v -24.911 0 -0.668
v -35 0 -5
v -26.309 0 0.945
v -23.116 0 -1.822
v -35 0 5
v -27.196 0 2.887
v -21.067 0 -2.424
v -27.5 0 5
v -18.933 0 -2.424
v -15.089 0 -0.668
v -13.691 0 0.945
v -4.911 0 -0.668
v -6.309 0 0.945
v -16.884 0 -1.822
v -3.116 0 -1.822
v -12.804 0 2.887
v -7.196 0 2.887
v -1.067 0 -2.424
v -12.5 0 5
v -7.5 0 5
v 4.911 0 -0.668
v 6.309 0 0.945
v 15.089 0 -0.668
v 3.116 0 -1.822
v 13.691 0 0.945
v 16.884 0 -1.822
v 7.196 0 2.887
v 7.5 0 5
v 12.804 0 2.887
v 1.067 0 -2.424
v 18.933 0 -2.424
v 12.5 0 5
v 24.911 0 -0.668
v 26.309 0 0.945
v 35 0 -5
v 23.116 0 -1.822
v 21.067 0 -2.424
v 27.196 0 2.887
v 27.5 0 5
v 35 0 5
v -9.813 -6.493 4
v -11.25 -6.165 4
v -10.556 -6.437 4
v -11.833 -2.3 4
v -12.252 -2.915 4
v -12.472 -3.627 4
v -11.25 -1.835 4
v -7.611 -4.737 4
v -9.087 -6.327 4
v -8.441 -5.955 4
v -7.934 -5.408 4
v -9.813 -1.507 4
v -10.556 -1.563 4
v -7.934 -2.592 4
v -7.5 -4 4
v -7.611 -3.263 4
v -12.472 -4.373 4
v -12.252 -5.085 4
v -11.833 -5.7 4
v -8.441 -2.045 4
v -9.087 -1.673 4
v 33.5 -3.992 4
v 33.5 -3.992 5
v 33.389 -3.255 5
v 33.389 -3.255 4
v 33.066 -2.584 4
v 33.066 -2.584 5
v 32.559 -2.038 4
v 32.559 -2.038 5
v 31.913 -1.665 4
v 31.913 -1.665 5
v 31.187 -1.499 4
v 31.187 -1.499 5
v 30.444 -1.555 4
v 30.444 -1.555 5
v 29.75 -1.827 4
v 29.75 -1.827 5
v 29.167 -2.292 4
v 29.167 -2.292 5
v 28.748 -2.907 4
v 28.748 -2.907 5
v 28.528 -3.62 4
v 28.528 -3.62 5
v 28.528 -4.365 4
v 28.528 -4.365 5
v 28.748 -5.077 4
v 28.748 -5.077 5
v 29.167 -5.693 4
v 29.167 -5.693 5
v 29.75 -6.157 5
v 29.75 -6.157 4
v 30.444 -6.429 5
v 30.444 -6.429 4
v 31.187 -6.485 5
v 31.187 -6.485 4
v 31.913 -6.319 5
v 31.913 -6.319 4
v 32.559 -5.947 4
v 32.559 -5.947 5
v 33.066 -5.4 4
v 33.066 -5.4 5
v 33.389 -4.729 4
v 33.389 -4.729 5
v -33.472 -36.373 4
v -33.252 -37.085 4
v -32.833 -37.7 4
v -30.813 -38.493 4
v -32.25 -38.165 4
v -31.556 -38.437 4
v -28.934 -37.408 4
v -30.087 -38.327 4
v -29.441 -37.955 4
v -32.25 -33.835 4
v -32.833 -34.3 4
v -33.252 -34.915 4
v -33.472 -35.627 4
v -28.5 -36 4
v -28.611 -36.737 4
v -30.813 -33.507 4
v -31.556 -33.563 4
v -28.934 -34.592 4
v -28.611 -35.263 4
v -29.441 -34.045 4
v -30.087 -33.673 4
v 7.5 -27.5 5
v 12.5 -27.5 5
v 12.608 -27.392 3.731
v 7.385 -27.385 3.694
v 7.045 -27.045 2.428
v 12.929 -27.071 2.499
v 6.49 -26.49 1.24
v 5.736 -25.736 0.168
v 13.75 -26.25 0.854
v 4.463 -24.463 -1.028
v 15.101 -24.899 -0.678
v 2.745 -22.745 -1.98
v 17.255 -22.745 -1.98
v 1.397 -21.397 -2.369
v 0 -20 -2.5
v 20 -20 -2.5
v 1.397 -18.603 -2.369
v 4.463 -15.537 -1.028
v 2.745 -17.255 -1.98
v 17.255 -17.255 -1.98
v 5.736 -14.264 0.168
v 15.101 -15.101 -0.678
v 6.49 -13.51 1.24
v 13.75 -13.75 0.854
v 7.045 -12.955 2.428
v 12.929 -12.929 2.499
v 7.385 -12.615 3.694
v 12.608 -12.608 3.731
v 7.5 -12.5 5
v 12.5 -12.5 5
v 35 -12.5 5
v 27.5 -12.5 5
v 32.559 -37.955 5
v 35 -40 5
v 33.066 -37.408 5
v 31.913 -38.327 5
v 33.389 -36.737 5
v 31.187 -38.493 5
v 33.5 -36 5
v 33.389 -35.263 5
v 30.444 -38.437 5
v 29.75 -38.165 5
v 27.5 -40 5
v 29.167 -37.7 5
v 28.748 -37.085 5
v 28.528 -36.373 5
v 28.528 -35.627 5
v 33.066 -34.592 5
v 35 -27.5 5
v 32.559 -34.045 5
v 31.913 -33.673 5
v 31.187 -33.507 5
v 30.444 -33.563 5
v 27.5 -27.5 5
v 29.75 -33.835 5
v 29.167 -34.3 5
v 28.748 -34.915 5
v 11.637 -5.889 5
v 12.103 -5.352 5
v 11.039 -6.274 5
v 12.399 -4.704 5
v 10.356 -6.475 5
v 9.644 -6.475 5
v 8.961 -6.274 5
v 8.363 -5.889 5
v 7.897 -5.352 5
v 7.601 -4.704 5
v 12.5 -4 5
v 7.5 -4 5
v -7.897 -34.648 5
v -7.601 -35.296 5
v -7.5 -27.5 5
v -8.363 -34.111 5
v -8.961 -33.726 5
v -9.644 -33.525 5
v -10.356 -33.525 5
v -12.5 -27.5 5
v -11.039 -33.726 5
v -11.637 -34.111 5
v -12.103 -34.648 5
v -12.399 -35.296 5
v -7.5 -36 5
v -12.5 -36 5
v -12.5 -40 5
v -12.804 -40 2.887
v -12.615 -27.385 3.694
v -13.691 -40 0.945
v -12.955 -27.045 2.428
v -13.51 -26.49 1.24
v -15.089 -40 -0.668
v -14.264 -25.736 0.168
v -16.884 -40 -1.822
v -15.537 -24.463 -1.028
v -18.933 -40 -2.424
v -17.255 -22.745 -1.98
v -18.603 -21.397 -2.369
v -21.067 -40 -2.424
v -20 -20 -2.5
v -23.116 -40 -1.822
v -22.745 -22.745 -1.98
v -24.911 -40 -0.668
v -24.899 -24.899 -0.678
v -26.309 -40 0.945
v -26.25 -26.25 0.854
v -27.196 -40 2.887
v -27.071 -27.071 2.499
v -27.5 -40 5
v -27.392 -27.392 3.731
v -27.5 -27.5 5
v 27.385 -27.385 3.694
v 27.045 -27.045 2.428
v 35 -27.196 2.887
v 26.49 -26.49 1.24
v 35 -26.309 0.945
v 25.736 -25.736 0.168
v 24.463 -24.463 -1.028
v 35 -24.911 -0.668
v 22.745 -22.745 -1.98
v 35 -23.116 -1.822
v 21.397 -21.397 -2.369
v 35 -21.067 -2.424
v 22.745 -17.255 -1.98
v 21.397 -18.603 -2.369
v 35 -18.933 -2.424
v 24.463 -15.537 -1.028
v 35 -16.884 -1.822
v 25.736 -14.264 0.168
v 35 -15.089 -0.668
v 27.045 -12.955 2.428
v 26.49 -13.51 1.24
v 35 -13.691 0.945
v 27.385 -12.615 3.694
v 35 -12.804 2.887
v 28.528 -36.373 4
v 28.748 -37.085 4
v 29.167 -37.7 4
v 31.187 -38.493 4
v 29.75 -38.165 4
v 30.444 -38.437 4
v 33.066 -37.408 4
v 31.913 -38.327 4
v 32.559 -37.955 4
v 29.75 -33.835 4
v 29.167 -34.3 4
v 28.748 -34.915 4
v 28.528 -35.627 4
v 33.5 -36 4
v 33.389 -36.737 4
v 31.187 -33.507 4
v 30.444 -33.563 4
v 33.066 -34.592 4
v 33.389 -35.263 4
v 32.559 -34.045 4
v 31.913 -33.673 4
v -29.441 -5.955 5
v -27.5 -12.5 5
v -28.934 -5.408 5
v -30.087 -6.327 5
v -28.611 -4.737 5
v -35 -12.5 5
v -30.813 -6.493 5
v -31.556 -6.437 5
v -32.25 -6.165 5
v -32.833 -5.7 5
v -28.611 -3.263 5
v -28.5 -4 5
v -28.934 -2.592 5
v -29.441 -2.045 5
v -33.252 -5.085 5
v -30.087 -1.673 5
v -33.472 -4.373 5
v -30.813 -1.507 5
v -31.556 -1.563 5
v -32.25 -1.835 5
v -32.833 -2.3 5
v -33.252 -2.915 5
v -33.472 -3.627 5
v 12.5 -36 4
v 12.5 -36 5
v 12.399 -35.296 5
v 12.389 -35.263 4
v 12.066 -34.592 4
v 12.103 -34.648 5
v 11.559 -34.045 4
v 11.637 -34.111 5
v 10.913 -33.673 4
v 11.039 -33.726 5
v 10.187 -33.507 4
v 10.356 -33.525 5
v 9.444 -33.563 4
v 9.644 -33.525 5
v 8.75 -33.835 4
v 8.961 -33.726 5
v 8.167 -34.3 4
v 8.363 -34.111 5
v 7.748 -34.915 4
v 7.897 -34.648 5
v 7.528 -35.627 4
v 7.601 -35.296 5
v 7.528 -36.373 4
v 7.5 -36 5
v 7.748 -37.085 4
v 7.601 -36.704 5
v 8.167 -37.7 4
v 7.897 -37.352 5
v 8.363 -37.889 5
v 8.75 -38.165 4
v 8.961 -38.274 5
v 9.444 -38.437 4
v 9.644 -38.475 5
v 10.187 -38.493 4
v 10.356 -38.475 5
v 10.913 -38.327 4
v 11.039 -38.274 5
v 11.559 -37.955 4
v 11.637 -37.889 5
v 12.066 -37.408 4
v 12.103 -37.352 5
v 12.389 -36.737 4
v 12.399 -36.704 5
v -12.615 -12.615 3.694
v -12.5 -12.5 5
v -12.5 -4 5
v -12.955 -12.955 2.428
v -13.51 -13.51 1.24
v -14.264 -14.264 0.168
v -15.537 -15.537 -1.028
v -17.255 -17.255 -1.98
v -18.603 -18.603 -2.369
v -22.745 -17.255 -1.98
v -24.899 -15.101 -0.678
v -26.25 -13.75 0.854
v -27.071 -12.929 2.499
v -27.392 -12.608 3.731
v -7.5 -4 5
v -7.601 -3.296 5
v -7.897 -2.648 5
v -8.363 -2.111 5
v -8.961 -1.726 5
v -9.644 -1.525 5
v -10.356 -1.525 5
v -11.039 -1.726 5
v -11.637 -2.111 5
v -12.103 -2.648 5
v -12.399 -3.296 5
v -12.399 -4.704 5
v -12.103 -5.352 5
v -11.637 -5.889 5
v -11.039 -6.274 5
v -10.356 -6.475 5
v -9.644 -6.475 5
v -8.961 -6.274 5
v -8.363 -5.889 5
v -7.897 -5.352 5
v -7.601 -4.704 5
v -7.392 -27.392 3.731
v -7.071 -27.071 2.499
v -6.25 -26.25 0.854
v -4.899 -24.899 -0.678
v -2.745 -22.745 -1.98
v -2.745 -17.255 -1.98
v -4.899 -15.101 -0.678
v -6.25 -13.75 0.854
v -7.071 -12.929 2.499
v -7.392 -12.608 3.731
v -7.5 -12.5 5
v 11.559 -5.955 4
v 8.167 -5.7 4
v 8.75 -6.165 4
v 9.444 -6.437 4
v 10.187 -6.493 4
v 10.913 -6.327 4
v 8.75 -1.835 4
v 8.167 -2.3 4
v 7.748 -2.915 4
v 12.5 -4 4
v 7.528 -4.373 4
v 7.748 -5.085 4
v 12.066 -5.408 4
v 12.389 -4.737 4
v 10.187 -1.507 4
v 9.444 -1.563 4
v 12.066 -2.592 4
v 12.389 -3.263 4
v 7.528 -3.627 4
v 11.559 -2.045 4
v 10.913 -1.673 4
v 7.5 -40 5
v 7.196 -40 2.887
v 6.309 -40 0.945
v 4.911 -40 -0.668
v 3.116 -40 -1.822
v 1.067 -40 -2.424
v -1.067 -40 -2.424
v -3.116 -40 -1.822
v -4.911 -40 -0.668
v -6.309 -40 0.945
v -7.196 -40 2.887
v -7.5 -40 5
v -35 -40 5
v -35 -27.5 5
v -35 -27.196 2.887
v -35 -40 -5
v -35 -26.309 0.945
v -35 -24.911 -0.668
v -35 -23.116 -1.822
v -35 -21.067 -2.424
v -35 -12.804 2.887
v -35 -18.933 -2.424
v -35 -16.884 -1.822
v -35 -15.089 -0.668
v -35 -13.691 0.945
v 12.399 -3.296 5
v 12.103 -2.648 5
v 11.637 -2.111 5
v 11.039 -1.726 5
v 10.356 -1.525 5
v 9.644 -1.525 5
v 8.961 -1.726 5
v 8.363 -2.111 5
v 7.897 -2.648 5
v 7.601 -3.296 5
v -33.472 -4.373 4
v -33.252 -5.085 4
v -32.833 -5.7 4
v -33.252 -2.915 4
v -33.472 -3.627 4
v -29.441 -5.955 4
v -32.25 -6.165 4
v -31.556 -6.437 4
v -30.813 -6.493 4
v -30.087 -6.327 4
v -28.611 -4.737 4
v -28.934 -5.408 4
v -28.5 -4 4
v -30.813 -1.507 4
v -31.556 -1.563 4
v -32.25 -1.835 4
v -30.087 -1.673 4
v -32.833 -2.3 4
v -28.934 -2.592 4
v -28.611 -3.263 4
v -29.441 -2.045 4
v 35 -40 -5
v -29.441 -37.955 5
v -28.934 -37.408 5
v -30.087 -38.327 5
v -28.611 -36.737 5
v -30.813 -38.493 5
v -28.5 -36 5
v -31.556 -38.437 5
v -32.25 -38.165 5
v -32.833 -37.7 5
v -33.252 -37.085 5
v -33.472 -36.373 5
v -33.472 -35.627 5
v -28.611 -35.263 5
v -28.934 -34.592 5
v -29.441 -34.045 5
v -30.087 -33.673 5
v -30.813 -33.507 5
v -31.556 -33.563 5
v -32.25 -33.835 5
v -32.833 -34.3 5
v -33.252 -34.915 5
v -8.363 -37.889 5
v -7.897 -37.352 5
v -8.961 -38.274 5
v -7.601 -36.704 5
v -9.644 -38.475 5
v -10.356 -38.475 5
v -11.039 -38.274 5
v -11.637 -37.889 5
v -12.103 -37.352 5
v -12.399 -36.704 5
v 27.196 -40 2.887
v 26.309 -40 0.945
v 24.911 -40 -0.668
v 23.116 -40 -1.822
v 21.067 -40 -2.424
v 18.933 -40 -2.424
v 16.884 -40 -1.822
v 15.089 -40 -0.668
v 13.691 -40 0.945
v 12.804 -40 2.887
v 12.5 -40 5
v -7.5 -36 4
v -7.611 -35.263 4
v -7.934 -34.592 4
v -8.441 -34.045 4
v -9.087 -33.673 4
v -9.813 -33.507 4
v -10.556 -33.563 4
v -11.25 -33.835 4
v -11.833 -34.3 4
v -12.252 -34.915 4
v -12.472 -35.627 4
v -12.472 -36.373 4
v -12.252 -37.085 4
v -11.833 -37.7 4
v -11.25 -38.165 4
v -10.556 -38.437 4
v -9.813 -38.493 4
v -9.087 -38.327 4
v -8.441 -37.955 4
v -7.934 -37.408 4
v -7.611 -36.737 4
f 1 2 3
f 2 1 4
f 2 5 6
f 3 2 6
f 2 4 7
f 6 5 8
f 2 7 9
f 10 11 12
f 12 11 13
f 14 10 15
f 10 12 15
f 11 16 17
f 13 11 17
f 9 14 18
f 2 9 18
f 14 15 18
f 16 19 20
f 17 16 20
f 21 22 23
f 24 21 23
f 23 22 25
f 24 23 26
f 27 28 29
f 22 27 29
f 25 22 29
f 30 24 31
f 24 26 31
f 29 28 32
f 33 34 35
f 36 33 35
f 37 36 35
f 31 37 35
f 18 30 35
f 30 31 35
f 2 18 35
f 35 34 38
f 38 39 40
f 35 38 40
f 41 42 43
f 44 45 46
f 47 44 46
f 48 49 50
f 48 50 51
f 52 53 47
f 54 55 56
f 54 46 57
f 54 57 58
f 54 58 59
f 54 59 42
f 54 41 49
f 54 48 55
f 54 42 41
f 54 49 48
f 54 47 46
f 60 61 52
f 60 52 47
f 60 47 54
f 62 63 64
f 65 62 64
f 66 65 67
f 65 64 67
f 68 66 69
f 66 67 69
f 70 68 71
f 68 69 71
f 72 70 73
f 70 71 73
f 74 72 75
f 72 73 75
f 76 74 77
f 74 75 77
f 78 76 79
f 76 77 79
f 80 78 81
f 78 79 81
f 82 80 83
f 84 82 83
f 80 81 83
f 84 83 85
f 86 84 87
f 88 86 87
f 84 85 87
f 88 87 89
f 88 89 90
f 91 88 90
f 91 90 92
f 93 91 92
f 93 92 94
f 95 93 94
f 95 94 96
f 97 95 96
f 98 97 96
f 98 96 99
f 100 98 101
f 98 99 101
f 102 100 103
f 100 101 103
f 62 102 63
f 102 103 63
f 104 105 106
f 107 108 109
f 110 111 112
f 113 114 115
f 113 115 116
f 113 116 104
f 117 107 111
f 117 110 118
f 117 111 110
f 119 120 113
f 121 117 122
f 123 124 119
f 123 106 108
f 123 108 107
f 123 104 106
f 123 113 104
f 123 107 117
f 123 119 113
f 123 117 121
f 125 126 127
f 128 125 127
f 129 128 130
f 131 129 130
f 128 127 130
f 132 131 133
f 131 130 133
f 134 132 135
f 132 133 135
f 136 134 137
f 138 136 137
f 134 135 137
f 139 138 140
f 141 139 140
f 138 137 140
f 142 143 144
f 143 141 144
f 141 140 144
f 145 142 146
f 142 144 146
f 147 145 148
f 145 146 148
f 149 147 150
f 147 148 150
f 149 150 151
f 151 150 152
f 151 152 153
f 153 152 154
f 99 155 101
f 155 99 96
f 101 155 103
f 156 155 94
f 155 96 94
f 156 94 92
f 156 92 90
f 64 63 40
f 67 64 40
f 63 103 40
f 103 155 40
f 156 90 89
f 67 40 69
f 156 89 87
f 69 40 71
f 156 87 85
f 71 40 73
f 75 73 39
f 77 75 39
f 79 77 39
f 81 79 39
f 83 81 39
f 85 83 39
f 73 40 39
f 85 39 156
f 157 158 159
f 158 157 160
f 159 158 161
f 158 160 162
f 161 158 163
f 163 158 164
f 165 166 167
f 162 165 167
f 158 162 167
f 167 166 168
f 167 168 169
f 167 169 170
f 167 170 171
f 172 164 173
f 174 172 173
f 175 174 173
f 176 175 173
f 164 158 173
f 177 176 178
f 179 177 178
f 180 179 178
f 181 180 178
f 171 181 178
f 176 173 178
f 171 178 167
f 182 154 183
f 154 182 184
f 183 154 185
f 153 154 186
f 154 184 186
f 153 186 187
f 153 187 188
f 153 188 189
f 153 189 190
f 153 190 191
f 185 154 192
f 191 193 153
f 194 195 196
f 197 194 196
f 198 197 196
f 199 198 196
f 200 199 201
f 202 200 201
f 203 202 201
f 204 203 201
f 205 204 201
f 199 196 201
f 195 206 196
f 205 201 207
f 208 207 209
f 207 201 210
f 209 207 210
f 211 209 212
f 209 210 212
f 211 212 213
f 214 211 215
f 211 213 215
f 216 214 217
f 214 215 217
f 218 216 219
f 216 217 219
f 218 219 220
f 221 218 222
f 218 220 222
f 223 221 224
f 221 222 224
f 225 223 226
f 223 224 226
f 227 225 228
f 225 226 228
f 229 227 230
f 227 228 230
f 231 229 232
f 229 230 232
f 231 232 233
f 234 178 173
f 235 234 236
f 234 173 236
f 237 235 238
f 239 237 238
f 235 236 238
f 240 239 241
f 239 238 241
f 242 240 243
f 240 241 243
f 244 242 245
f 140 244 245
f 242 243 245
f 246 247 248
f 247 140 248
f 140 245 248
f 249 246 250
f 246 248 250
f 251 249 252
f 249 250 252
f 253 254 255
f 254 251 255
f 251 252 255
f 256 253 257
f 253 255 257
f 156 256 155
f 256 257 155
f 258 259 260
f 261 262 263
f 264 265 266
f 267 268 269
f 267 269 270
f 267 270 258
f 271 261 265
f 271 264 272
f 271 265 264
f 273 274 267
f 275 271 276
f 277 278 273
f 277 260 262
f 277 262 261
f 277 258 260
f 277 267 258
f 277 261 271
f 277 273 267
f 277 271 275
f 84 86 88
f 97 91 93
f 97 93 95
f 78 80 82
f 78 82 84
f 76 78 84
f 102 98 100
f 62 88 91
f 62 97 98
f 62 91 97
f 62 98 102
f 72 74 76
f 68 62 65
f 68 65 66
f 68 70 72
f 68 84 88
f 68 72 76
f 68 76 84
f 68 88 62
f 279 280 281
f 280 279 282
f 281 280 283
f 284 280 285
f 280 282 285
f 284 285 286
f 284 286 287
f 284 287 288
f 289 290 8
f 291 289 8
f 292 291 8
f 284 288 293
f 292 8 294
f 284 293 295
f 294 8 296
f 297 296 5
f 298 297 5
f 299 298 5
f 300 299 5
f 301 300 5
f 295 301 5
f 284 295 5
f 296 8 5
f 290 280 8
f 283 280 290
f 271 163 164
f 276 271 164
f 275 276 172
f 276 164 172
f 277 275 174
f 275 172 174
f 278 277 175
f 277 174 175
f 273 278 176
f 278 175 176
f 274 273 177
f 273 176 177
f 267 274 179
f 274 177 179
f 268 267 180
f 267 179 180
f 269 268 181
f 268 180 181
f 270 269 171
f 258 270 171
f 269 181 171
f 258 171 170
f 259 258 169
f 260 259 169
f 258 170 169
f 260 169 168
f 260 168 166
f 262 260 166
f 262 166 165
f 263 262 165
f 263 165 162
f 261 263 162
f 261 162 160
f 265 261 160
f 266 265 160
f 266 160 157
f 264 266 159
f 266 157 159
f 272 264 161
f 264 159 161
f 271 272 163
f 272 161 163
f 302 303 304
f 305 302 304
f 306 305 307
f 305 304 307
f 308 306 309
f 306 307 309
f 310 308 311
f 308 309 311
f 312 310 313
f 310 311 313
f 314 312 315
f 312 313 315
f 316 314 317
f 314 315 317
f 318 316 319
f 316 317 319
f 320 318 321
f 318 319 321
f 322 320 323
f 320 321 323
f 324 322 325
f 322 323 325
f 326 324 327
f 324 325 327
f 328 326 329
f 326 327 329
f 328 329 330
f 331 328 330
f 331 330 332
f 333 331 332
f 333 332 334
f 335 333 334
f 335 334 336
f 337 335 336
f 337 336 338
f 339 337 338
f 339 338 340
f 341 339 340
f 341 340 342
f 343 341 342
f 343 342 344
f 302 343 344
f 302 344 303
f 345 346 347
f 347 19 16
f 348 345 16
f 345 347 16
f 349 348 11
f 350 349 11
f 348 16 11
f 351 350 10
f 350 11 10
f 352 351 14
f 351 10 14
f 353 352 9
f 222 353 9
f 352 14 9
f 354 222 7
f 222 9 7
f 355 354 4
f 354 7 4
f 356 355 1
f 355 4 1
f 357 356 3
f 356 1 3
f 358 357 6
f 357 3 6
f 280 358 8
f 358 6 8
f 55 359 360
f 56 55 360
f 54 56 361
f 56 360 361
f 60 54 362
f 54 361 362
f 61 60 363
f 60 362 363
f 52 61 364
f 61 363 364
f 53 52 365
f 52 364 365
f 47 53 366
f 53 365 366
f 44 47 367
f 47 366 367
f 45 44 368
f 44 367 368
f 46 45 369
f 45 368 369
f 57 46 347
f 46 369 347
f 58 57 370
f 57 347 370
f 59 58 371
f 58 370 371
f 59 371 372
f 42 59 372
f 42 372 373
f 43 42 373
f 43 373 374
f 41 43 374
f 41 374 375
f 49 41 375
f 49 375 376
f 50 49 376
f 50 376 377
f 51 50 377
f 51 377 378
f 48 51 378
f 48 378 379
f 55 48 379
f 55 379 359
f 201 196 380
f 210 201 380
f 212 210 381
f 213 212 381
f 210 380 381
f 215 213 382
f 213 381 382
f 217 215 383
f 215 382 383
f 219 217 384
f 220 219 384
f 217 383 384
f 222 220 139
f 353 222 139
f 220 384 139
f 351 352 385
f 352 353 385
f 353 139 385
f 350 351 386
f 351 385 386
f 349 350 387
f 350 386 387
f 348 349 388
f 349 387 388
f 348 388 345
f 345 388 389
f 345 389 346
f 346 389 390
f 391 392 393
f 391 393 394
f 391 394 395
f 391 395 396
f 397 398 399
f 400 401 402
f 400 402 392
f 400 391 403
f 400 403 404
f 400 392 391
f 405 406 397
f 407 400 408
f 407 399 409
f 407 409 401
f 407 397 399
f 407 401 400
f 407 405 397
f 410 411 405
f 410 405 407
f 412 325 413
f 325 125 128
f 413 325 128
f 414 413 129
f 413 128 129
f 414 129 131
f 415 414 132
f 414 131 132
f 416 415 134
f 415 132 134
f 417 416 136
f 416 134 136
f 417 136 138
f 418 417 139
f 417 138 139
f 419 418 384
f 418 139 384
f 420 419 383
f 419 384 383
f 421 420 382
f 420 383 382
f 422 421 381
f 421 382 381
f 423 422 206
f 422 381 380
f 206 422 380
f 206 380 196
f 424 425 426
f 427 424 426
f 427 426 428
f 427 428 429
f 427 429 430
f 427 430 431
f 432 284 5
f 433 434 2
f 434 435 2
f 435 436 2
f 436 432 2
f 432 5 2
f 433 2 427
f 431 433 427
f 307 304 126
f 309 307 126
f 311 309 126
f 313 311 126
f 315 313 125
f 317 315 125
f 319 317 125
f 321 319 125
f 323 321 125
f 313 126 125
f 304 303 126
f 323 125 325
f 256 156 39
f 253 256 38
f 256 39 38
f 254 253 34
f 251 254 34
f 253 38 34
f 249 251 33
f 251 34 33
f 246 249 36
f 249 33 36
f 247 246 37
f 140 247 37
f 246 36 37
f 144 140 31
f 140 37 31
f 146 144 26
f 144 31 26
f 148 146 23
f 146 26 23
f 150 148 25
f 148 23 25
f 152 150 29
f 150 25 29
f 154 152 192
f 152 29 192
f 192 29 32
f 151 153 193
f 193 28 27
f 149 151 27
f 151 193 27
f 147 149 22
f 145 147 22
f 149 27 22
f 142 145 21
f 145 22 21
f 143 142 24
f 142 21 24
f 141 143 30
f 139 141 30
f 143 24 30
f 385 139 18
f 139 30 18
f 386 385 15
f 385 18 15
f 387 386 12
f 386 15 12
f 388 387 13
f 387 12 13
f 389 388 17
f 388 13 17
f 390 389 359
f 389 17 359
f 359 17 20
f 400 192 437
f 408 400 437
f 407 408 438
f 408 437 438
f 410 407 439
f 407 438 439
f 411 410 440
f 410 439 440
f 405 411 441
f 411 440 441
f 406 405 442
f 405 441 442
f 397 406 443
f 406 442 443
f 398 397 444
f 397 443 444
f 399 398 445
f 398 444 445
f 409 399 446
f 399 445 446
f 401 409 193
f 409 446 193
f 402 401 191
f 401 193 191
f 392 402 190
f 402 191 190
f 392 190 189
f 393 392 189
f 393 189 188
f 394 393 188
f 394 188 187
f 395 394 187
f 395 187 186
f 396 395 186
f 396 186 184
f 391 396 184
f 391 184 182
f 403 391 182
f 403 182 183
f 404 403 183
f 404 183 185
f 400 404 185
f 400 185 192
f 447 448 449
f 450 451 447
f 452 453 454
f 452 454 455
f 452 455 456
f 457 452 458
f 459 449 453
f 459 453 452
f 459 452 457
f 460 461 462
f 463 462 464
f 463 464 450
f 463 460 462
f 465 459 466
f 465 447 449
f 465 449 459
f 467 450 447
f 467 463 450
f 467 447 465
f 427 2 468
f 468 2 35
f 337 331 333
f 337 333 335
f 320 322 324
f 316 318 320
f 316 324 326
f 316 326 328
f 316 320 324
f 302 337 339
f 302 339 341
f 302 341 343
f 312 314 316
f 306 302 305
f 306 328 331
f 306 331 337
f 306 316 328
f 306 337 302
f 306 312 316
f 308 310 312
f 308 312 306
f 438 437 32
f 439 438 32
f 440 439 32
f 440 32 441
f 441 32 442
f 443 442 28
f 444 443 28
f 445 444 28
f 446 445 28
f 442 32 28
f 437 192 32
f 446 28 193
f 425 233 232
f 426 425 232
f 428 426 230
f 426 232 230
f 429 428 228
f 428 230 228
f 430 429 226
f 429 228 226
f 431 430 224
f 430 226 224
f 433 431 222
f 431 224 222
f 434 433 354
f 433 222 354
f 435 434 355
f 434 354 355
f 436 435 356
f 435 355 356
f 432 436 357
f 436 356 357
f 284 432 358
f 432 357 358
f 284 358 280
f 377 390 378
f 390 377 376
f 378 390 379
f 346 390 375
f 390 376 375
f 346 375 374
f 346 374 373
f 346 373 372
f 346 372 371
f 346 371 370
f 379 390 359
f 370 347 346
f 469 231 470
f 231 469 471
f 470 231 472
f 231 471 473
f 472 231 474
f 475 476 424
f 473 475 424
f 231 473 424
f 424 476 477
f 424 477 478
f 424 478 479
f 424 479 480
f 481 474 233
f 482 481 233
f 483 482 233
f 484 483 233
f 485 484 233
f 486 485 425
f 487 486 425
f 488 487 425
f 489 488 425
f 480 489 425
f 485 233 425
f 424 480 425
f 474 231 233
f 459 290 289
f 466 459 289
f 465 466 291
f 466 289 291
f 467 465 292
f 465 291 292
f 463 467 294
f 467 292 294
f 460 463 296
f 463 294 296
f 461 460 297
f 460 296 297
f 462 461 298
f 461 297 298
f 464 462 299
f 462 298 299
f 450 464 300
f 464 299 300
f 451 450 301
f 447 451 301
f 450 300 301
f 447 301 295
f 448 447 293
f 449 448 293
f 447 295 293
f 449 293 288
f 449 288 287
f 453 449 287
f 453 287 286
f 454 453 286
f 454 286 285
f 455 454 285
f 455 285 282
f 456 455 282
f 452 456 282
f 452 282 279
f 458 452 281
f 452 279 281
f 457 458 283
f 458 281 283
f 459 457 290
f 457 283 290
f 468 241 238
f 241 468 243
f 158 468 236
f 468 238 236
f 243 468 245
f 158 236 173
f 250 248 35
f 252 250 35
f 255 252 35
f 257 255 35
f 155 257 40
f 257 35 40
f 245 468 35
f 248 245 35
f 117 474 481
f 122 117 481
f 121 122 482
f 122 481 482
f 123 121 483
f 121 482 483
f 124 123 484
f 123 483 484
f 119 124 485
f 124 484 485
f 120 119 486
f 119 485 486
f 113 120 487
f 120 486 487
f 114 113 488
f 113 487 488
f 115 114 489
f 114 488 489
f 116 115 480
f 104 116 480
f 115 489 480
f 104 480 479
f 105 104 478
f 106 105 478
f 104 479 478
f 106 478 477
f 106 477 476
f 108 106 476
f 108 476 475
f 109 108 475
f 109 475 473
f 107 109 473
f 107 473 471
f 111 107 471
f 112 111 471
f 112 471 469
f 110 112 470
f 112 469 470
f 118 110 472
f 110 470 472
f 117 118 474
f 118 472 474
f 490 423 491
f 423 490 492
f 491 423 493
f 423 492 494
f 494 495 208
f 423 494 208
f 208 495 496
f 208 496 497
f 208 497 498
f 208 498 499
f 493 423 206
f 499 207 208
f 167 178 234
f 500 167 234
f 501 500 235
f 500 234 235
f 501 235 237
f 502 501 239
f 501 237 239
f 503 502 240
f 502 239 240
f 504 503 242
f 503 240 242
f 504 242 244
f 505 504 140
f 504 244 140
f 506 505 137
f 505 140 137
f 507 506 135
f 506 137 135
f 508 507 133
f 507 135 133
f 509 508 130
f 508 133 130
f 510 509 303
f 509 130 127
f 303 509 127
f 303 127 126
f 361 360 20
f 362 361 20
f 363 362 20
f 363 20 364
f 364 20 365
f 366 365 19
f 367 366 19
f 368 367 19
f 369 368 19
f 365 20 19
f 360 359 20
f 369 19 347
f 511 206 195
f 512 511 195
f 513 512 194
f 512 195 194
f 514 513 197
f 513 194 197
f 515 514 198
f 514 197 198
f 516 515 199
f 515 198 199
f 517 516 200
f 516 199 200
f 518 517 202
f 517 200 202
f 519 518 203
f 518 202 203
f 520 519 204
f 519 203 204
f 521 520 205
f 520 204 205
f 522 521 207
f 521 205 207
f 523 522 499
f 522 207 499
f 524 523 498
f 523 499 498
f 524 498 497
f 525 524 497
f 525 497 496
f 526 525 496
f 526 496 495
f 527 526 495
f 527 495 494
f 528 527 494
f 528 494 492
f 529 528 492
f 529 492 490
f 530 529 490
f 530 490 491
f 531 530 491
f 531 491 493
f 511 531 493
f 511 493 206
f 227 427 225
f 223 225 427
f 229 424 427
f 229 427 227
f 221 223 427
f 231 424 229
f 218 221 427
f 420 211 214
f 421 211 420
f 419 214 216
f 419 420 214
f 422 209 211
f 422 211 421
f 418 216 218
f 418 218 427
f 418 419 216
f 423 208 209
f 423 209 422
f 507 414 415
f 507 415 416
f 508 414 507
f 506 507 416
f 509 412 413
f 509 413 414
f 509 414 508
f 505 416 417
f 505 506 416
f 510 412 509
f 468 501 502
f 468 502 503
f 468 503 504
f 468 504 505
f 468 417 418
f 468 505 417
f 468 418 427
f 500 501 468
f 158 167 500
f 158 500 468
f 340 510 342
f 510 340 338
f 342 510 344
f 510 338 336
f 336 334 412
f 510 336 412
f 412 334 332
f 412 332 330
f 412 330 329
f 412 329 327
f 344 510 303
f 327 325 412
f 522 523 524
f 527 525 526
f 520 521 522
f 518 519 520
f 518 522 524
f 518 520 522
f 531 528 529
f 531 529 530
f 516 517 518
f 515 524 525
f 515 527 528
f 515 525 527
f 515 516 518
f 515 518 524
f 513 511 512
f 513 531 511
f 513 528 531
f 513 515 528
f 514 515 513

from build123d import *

# Parameters (mm, degrees)
F1_DEPTH  = 40
F3_DEPTH  = 70.001
F4_R      = 2.5
F5_DEPTH  = 1
F6_R      = 2.5
F7_DEPTH  = 1
F8_R      = 2.5
F9_DEPTH  = 1
F10_R     = 2.5
F11_DEPTH = 1
F13_DEPTH = 1
F15_DEPTH = 1
F17_DEPTH = 1
F19_DEPTH = 1


with BuildPart() as f1:
    # F0 (on Front) → F1 (new body)
    with BuildSketch(Plane.XZ):
        with BuildLine():
            Line((-35, -5), (35, -5))
            Line((35, -5), (35, 5))
            Line((35, 5), (27.5, 5))
            ThreePointArc((27.5, 5), (20, -2.5), (12.5, 5))
            Line((12.5, 5), (7.5, 5))
            ThreePointArc((7.5, 5), (0, -2.5), (-7.5, 5))
            Line((-7.5, 5), (-12.5, 5))
            ThreePointArc((-12.5, 5), (-20, -2.5), (-27.5, 5))
            Line((-27.5, 5), (-35, 5))
            Line((-35, 5), (-35, -5))
        make_face()
    extrude(amount=F1_DEPTH)

    # F2 (on face) → F3 (cut, through all)
    with BuildSketch(Plane.YZ.offset(35)):
        with BuildLine():
            ThreePointArc((-27.5, 5), (-20, -2.5), (-12.5, 5))
            Line((-12.5, 5), (-27.5, 5))
        make_face()
    extrude(amount=-F3_DEPTH, mode=Mode.SUBTRACT)

    # F4 (on face) → F5 (cut)
    with BuildSketch(Plane.XY.offset(5)):
        with Locations((31, -36)):
            Circle(F4_R)
    extrude(amount=-F5_DEPTH, mode=Mode.SUBTRACT)

    # F6 (on face) → F7 (cut)
    with BuildSketch(Plane.XY.offset(5)):
        with Locations((31, -3.9921798557)):
            Circle(F6_R)
    extrude(amount=-F7_DEPTH, mode=Mode.SUBTRACT)

    # F8 (on face) → F9 (cut)
    with BuildSketch(Plane.XY.offset(5)):
        with Locations((-31, -36)):
            Circle(F8_R)
    extrude(amount=-F9_DEPTH, mode=Mode.SUBTRACT)

    # F10 (on face) → F11 (cut)
    with BuildSketch(Plane.XY.offset(5)):
        with Locations((-31, -4)):
            Circle(F10_R)
    extrude(amount=-F11_DEPTH, mode=Mode.SUBTRACT)

    # F12 (on face) → F13 (cut)
    with BuildSketch(Plane.XY.offset(5)):
        with BuildLine():
            ThreePointArc((-12.5, -4), (-10, -6.5), (-7.5, -4))
            ThreePointArc((-7.5, -4), (-10, -1.5), (-12.5, -4))
        make_face()
    extrude(amount=-F13_DEPTH, mode=Mode.SUBTRACT)

    # F14 (on face) → F15 (cut)
    with BuildSketch(Plane.XY.offset(5)):
        with BuildLine():
            ThreePointArc((7.5, -4), (10, -6.5), (12.5, -4))
            ThreePointArc((12.5, -4), (10, -1.5), (7.5, -4))
        make_face()
    extrude(amount=-F15_DEPTH, mode=Mode.SUBTRACT)

    # F16 (on face) → F17 (cut)
    with BuildSketch(Plane.XY.offset(5)):
        with BuildLine():
            ThreePointArc((-12.5, -36), (-10, -38.5), (-7.5, -36))
            ThreePointArc((-7.5, -36), (-10, -33.5), (-12.5, -36))
        make_face()
    extrude(amount=-F17_DEPTH, mode=Mode.SUBTRACT)

    # F18 (on face) → F19 (cut)
    with BuildSketch(Plane.XY.offset(5)):
        with BuildLine():
            ThreePointArc((7.5, -36), (10, -38.5), (12.5, -36))
            ThreePointArc((12.5, -36), (10, -33.5), (7.5, -36))
        make_face()
    extrude(amount=-F19_DEPTH, mode=Mode.SUBTRACT)


solid = f1.part
